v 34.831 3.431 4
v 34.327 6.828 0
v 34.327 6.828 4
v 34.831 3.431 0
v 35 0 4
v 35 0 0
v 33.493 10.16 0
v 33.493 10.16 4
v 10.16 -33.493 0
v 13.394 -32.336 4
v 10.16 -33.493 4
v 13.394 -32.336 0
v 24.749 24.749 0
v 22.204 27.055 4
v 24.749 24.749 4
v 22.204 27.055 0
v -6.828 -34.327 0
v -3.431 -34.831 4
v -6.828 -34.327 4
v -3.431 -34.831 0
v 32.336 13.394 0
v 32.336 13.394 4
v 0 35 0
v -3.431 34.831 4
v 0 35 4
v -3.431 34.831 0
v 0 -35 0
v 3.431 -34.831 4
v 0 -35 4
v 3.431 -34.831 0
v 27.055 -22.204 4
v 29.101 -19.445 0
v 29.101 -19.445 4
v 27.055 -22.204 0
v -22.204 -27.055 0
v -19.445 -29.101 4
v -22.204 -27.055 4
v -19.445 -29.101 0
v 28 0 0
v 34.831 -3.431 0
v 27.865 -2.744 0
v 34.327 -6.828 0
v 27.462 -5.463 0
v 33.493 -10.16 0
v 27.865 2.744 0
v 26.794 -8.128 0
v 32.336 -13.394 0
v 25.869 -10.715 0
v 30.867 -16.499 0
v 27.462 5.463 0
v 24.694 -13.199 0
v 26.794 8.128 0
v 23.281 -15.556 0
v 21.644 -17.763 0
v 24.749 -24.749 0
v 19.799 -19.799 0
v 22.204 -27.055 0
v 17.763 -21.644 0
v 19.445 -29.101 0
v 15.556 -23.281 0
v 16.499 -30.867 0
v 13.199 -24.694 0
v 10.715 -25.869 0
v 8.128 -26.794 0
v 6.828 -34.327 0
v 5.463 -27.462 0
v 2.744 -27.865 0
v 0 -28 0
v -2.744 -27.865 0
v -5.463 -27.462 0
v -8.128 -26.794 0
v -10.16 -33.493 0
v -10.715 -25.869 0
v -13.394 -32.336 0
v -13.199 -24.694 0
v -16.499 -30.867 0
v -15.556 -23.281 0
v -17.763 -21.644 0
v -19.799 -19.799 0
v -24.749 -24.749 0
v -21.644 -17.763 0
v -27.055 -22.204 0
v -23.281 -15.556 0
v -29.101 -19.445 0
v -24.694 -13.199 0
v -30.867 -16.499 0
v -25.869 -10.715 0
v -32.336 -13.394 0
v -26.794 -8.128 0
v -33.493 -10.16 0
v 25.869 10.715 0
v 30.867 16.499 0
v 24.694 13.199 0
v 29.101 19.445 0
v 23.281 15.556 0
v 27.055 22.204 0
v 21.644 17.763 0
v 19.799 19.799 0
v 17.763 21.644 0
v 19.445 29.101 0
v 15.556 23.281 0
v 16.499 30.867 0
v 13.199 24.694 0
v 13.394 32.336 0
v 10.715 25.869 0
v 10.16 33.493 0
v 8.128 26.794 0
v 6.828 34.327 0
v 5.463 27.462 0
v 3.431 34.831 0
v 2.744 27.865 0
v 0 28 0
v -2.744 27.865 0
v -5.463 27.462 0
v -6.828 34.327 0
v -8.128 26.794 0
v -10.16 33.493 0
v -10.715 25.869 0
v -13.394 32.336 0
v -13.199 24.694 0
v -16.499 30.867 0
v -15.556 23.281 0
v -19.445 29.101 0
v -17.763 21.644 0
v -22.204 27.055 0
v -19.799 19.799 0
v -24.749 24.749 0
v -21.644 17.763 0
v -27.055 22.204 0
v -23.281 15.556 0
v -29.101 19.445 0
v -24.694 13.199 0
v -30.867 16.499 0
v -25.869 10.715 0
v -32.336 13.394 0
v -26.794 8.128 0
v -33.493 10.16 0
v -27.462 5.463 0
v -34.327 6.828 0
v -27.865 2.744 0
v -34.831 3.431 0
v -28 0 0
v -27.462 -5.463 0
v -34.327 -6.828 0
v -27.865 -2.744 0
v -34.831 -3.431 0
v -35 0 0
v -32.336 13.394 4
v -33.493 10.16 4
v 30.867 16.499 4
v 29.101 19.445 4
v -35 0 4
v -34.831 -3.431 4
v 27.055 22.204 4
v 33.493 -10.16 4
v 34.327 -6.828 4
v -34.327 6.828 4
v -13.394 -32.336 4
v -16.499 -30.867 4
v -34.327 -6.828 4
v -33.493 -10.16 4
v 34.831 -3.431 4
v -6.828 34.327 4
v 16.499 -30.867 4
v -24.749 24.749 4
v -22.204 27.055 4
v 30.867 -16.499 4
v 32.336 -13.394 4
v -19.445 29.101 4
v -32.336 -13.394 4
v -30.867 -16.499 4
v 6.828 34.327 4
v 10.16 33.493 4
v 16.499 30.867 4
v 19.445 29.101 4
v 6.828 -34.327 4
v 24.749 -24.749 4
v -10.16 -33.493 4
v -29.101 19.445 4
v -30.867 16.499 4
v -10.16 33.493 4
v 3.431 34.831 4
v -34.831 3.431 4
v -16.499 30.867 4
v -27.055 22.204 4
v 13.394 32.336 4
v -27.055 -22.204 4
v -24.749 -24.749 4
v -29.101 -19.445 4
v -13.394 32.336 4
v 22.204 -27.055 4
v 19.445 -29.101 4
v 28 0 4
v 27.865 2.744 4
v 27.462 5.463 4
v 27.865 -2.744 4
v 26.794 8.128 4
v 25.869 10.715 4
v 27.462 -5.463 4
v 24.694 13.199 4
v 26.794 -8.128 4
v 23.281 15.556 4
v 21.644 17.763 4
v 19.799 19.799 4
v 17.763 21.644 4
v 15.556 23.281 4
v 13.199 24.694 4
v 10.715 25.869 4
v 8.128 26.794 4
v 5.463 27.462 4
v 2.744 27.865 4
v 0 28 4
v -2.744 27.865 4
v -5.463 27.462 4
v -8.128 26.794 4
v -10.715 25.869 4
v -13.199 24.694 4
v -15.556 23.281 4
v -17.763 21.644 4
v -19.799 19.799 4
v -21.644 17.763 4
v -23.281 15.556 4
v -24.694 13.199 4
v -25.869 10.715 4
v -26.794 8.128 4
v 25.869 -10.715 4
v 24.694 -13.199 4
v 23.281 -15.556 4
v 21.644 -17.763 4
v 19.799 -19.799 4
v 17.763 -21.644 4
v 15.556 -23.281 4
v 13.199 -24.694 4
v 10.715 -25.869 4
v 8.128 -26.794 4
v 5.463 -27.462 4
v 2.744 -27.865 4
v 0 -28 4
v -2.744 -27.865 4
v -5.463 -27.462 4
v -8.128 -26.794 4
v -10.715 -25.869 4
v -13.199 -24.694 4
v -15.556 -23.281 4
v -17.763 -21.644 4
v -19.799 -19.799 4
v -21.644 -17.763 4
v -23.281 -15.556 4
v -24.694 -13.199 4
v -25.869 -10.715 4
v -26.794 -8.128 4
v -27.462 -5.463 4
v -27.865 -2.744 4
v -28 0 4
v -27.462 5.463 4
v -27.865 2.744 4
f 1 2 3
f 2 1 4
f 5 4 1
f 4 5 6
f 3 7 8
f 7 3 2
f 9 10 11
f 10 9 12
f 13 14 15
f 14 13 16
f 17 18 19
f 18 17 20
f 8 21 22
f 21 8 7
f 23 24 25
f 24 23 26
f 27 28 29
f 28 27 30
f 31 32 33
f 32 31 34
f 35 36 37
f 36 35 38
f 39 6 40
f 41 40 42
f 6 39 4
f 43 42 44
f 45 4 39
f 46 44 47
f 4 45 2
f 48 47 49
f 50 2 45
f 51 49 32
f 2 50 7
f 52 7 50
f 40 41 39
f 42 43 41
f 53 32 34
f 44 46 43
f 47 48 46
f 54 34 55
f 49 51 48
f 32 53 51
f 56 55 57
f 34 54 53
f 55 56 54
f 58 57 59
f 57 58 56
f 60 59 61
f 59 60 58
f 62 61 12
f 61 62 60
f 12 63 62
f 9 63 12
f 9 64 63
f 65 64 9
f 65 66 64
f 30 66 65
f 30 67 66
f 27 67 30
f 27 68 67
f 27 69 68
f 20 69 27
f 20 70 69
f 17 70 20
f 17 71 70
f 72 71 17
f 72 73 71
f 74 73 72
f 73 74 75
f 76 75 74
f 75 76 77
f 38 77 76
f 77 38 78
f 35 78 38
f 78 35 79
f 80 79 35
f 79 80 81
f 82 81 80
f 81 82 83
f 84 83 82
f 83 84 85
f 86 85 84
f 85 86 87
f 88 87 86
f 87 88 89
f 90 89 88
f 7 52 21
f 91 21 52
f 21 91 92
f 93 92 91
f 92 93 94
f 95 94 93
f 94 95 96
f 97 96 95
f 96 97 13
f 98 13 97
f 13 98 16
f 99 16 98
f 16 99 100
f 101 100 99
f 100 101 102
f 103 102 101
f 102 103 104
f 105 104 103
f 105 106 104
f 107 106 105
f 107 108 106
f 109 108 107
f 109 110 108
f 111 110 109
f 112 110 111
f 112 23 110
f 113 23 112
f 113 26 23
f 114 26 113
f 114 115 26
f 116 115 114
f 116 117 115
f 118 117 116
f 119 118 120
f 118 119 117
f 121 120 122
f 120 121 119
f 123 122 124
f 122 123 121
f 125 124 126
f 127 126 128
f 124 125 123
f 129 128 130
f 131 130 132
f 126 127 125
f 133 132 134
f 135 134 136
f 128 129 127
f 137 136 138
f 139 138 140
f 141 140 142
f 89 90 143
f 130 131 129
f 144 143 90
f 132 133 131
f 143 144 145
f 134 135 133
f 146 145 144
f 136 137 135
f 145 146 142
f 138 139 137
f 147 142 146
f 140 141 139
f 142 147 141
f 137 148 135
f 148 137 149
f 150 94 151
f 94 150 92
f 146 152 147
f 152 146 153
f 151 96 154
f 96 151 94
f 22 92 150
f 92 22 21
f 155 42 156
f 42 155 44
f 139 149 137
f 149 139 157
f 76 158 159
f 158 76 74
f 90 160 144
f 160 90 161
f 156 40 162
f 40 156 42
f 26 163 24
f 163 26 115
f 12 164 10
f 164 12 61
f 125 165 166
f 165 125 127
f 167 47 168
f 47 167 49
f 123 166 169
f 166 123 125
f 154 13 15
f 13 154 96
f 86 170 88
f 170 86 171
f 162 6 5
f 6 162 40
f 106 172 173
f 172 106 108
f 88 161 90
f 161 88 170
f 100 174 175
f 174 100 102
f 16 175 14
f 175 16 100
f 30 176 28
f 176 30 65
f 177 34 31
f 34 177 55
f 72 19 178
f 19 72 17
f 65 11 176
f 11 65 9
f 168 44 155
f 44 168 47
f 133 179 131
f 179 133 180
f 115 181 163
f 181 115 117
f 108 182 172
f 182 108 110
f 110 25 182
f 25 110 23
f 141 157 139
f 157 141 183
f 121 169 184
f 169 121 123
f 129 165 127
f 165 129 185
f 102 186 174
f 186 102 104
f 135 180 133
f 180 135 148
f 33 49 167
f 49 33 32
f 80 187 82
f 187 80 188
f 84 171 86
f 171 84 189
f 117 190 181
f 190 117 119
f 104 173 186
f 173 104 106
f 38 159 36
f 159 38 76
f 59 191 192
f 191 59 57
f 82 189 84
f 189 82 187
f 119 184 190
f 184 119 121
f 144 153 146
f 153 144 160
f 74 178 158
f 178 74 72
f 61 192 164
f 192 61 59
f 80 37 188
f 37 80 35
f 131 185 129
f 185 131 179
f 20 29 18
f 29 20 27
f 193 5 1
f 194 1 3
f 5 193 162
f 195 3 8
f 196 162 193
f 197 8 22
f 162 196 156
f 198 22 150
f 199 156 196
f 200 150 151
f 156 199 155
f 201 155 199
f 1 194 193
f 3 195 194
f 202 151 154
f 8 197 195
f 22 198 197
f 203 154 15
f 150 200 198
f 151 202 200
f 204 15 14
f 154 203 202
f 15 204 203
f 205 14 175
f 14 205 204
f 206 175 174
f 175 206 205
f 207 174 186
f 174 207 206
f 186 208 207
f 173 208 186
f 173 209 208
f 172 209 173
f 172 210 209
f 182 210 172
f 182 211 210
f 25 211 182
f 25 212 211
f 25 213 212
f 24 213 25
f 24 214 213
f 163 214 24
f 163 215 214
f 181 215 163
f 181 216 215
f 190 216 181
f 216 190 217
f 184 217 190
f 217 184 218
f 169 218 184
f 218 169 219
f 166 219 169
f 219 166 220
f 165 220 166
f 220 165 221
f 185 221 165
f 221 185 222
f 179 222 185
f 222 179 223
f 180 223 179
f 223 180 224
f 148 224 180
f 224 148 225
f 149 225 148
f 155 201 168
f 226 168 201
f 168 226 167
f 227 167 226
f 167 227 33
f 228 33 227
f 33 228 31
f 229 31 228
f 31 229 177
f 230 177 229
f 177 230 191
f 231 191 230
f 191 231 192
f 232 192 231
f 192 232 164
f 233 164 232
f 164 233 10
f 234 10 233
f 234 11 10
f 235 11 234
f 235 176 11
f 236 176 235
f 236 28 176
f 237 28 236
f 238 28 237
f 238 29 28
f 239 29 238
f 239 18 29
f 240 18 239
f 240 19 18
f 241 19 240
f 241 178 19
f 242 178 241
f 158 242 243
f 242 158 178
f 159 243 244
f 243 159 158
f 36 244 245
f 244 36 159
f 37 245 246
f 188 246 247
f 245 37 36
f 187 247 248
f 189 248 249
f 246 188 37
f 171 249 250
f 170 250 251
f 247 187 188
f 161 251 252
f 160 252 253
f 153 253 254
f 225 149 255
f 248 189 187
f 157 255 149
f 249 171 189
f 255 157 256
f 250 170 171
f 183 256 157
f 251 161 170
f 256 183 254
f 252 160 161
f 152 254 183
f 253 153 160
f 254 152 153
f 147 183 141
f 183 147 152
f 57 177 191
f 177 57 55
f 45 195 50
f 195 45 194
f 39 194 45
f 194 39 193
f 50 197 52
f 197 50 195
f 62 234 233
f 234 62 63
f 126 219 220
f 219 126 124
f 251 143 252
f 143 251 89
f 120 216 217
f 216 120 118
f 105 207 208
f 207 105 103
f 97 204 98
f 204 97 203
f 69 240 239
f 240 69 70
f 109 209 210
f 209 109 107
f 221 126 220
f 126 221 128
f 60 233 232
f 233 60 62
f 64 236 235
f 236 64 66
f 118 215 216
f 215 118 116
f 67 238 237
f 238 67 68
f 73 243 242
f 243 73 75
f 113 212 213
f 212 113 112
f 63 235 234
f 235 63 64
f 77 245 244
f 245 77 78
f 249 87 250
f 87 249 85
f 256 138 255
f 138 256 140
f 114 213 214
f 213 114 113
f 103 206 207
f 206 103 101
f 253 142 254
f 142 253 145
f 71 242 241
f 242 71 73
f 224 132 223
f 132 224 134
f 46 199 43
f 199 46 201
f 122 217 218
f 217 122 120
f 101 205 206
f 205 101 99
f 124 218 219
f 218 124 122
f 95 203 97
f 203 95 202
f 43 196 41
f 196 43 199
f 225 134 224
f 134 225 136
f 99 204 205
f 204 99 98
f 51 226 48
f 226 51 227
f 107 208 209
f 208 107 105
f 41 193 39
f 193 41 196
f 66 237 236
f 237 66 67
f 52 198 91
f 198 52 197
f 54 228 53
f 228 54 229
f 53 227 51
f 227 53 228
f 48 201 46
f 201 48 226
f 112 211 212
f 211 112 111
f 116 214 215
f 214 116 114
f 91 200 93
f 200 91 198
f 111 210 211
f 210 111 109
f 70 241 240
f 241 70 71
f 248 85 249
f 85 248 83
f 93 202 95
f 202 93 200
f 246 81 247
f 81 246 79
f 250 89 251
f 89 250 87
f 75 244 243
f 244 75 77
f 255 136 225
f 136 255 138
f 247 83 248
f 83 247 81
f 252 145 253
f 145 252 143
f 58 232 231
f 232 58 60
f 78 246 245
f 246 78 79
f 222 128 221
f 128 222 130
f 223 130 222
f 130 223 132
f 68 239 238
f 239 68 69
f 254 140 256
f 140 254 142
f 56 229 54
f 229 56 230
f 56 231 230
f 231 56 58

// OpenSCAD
module lidar_mount(){
  difference(){
    cylinder(h=4,r=35,$fn=64);
    translate([0,0,-0.1]) cylinder(h=4.2,r=28,$fn=64);
  }
}
lidar_mount();
